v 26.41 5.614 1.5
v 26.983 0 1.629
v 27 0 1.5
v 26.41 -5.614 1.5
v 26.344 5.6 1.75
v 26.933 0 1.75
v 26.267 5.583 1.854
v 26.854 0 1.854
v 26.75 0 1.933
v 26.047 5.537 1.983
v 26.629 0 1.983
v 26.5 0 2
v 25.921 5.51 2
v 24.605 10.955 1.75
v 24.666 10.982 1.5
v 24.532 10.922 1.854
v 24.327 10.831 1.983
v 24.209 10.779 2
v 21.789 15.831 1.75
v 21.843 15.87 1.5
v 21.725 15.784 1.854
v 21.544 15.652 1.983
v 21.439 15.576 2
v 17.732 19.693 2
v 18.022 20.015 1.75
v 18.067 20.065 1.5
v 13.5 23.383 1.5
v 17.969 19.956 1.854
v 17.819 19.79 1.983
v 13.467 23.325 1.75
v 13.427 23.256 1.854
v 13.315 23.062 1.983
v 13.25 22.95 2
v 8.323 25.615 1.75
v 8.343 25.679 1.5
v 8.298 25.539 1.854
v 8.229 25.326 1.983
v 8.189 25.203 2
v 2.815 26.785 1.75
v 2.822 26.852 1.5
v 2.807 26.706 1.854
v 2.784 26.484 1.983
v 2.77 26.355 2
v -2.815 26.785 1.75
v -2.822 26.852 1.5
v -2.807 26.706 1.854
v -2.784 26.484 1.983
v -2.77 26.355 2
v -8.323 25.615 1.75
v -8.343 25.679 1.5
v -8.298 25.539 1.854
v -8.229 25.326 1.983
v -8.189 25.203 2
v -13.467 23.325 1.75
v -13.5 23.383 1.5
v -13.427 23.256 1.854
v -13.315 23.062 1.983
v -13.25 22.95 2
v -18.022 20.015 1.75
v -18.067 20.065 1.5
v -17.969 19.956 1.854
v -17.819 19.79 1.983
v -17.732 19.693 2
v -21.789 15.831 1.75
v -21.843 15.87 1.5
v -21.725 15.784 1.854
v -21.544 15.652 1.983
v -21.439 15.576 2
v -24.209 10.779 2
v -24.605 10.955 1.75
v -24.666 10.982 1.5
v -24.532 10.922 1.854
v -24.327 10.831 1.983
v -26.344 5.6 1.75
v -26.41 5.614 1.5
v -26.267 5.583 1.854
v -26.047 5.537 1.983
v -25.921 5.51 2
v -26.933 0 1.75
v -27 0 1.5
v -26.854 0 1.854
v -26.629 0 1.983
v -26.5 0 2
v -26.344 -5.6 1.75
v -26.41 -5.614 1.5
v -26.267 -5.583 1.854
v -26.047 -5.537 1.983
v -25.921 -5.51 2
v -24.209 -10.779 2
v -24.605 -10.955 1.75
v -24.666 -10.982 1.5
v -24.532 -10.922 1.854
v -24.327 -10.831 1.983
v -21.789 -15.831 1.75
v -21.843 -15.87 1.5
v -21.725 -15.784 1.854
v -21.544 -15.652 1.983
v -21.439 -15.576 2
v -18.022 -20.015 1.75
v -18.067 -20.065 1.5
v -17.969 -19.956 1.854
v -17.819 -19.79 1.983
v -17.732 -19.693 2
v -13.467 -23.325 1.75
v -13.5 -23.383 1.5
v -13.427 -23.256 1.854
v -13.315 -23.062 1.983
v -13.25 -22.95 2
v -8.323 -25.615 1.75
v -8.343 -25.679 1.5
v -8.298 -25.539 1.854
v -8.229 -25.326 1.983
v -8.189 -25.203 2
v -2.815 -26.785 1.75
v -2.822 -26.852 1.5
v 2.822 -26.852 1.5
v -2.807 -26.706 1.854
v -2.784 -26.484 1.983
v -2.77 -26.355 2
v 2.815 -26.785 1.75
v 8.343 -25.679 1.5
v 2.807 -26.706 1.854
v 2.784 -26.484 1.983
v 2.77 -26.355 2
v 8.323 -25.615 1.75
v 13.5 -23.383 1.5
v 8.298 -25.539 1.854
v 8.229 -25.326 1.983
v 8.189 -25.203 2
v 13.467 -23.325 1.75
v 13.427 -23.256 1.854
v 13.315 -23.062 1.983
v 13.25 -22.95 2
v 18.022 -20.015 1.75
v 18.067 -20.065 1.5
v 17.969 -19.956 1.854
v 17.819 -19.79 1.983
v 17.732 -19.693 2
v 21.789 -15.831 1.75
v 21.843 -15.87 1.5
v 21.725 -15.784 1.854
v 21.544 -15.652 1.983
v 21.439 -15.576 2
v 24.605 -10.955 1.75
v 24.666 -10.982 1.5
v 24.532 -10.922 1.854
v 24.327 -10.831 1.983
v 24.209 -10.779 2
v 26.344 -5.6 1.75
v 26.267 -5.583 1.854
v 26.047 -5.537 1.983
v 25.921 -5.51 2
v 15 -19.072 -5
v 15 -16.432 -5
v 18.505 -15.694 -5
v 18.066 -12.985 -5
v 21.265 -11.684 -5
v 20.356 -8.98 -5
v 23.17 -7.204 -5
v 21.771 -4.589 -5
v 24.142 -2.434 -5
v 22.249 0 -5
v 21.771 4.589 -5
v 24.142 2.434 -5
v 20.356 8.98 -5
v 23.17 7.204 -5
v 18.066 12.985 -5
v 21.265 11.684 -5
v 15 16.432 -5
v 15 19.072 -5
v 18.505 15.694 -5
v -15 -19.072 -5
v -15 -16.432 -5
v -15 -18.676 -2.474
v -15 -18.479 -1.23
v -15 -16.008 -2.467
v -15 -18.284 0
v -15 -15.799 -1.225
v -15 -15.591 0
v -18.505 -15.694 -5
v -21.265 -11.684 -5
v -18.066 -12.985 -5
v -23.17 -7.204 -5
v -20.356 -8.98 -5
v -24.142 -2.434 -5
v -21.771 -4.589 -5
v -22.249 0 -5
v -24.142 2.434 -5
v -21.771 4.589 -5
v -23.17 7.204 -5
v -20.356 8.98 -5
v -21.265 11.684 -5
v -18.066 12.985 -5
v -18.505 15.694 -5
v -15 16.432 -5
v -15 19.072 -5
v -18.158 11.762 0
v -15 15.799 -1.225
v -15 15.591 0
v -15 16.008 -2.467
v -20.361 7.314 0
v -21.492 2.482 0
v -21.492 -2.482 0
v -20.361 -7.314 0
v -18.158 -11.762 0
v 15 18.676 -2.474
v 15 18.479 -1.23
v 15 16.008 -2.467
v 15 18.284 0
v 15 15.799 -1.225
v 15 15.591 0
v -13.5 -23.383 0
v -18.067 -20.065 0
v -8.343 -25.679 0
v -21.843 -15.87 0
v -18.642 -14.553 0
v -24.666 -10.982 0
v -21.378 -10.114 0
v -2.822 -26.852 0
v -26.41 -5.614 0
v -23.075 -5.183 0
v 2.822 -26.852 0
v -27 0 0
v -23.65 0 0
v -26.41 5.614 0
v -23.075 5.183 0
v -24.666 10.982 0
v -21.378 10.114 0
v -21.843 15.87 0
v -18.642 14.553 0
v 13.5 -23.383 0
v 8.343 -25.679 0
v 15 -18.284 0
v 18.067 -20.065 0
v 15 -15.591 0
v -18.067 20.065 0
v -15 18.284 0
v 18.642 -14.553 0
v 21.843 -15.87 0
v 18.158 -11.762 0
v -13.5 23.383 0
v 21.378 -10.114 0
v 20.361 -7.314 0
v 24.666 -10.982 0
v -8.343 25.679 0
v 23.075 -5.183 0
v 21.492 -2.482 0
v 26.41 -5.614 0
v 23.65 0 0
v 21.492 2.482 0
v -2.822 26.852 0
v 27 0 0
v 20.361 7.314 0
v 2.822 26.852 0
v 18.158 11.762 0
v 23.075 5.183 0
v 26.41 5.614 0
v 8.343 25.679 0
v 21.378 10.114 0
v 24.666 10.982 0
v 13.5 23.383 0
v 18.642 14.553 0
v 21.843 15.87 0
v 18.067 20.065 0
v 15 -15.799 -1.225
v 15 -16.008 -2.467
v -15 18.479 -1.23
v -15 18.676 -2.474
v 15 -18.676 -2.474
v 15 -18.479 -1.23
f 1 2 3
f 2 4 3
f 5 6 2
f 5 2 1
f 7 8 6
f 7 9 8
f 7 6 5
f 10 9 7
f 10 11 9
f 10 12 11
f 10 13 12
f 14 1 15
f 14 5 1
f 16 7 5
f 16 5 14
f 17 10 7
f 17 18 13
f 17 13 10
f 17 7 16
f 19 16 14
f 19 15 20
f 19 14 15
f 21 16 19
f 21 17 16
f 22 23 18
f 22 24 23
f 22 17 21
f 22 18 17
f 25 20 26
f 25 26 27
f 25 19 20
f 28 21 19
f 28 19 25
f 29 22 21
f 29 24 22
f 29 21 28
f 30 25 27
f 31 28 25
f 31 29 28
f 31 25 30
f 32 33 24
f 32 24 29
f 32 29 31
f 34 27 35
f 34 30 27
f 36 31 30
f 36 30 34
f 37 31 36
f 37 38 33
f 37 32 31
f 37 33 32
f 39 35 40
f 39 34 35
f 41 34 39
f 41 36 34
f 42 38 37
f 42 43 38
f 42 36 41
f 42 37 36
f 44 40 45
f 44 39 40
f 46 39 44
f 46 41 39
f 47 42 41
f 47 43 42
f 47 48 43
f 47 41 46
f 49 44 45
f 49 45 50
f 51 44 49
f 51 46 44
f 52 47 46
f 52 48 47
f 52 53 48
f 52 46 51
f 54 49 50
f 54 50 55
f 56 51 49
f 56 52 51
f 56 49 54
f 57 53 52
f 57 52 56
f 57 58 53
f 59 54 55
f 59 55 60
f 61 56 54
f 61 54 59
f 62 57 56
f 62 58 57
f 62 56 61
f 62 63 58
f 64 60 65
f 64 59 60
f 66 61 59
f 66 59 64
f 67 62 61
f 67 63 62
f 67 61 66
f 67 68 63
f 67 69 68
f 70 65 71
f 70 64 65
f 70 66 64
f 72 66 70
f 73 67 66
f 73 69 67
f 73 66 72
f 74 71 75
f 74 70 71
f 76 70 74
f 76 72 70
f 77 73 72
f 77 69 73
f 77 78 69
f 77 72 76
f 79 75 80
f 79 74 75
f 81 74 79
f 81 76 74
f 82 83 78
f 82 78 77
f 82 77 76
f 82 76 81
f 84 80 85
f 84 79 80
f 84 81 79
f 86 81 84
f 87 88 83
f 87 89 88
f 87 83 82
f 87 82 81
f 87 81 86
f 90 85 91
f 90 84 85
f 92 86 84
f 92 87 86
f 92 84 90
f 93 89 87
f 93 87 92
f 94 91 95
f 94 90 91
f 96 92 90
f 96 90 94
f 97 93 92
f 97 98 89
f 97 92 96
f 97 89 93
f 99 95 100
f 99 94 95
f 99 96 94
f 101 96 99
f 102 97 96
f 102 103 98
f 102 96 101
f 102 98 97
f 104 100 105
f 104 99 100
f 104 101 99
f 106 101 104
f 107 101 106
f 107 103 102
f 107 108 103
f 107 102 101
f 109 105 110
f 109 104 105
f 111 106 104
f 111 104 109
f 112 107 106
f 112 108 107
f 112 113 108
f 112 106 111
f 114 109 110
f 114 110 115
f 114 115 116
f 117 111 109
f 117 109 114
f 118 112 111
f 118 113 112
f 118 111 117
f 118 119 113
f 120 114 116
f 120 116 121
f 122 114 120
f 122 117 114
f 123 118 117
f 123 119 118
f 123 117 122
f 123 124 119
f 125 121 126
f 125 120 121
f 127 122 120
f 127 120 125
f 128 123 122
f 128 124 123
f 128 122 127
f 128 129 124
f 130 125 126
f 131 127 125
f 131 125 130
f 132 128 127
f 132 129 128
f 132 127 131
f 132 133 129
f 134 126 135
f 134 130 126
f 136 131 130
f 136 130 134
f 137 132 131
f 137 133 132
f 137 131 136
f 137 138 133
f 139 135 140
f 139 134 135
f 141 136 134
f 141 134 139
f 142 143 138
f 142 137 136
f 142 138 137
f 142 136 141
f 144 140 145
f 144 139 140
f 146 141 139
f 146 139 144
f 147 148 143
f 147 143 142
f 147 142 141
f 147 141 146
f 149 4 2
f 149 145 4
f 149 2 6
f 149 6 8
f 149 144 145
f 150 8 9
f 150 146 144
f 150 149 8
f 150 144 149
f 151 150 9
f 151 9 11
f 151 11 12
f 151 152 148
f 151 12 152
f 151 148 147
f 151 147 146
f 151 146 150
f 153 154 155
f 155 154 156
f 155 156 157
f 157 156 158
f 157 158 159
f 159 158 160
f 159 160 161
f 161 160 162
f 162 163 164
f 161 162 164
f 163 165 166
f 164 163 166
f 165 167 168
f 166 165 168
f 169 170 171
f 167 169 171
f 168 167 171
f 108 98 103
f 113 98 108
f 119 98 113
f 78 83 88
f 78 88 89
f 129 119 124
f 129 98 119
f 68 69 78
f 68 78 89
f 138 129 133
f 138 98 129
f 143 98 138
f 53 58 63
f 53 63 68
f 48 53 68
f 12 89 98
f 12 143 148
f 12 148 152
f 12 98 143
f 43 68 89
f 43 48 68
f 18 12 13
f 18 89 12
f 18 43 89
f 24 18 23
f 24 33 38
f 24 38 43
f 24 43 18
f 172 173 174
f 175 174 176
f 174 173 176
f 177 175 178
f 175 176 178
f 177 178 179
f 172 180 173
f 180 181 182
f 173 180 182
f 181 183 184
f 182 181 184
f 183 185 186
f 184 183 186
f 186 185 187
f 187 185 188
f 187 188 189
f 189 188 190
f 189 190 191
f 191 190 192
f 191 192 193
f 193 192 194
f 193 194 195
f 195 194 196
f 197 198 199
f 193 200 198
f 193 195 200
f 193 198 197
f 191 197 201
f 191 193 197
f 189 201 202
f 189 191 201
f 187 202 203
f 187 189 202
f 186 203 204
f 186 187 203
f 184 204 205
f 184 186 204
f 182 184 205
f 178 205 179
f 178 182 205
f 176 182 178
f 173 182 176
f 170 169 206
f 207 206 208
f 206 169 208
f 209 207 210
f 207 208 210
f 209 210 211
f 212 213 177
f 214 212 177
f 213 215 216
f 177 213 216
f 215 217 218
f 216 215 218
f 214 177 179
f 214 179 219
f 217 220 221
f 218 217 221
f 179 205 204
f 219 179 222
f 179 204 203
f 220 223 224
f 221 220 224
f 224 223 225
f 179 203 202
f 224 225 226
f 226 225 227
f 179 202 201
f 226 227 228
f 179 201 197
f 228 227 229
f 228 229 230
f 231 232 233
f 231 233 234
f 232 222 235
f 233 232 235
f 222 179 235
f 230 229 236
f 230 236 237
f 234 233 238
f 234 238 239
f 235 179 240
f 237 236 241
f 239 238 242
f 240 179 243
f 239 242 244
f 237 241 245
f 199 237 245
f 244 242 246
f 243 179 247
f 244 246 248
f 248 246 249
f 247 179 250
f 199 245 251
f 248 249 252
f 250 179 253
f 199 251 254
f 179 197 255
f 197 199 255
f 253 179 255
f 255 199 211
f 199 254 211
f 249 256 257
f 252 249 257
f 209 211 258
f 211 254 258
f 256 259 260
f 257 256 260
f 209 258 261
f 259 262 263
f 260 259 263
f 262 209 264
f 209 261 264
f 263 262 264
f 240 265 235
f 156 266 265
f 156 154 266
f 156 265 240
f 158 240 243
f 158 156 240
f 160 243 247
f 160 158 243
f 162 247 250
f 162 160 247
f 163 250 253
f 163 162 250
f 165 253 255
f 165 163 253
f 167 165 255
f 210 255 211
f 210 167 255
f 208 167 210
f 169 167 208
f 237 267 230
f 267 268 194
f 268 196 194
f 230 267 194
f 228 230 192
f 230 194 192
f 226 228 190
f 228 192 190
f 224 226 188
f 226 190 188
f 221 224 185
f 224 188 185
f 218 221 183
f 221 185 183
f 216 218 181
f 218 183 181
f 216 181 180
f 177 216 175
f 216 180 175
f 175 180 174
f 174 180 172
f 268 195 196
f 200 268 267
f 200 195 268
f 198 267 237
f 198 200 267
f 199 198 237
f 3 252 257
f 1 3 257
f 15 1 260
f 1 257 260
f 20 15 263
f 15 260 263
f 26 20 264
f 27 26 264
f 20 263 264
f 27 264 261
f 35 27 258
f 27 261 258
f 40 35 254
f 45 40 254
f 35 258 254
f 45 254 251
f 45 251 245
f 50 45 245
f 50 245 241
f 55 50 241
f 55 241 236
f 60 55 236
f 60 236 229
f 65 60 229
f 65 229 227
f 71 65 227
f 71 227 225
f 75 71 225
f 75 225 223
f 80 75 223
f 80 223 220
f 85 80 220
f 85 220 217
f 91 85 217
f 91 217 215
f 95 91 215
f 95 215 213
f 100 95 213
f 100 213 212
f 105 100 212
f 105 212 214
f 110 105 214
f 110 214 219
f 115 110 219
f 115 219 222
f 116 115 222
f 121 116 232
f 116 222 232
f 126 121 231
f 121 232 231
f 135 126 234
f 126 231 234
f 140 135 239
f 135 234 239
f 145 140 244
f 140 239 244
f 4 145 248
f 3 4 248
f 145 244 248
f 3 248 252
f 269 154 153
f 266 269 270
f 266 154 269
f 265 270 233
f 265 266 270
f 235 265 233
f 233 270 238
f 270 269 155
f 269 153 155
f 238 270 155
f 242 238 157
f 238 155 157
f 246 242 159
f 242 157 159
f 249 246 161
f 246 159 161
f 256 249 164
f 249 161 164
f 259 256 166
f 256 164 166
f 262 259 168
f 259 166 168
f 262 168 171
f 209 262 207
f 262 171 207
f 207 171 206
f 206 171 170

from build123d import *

# Parameters (mm, degrees)
F0_R          = 27
F0_R_2        = 23.65
F1_DEPTH      = 2
F2_DEPTH      = 5
F2_TAPER      = -7
F3_T          = -2
F4_W          = 15
F4_H          = 7.3000405619
F5_DEPTH      = 25
F5_DEPTH_BACK = 25
F6_R          = 0.5


with BuildPart() as f1:
    # F0 (on Top) → F1 (new body)
    with BuildSketch(Plane.XY):
        Circle(F0_R)
        Circle(F0_R_2, mode=Mode.SUBTRACT)
        Circle(F0_R_2)
    extrude(amount=F1_DEPTH)

    # F0 (on Top) → F2 (join)
    with BuildSketch(Plane.XY):
        Circle(F0_R_2)
    extrude(amount=-F2_DEPTH, taper=F2_TAPER)

    # F3
    f3_openings = [f1.faces().sort_by_distance(p)[0] for p in [
        (0, 0, -5),
    ]]
    offset(amount=F3_T, openings=f3_openings, kind=Kind.INTERSECTION)

    # F4 (on Front) → F5 (cut, two sides)
    with BuildSketch(Plane.XZ) as f5_sk:
        with Locations((7.5, -3.6500202809)):
            Rectangle(F4_W, F4_H)
        with Locations((-7.5, -3.6500202809)):
            Rectangle(F4_W, F4_H)
    extrude(amount=-F5_DEPTH, mode=Mode.SUBTRACT)
    extrude(f5_sk.sketch, amount=F5_DEPTH_BACK, mode=Mode.SUBTRACT)

    # F6
    f6_edges = [f1.edges().sort_by_distance(p)[0] for p in [
        (-27, 0, 2),
    ]]
    fillet(f6_edges, radius=F6_R)


solid = f1.part
